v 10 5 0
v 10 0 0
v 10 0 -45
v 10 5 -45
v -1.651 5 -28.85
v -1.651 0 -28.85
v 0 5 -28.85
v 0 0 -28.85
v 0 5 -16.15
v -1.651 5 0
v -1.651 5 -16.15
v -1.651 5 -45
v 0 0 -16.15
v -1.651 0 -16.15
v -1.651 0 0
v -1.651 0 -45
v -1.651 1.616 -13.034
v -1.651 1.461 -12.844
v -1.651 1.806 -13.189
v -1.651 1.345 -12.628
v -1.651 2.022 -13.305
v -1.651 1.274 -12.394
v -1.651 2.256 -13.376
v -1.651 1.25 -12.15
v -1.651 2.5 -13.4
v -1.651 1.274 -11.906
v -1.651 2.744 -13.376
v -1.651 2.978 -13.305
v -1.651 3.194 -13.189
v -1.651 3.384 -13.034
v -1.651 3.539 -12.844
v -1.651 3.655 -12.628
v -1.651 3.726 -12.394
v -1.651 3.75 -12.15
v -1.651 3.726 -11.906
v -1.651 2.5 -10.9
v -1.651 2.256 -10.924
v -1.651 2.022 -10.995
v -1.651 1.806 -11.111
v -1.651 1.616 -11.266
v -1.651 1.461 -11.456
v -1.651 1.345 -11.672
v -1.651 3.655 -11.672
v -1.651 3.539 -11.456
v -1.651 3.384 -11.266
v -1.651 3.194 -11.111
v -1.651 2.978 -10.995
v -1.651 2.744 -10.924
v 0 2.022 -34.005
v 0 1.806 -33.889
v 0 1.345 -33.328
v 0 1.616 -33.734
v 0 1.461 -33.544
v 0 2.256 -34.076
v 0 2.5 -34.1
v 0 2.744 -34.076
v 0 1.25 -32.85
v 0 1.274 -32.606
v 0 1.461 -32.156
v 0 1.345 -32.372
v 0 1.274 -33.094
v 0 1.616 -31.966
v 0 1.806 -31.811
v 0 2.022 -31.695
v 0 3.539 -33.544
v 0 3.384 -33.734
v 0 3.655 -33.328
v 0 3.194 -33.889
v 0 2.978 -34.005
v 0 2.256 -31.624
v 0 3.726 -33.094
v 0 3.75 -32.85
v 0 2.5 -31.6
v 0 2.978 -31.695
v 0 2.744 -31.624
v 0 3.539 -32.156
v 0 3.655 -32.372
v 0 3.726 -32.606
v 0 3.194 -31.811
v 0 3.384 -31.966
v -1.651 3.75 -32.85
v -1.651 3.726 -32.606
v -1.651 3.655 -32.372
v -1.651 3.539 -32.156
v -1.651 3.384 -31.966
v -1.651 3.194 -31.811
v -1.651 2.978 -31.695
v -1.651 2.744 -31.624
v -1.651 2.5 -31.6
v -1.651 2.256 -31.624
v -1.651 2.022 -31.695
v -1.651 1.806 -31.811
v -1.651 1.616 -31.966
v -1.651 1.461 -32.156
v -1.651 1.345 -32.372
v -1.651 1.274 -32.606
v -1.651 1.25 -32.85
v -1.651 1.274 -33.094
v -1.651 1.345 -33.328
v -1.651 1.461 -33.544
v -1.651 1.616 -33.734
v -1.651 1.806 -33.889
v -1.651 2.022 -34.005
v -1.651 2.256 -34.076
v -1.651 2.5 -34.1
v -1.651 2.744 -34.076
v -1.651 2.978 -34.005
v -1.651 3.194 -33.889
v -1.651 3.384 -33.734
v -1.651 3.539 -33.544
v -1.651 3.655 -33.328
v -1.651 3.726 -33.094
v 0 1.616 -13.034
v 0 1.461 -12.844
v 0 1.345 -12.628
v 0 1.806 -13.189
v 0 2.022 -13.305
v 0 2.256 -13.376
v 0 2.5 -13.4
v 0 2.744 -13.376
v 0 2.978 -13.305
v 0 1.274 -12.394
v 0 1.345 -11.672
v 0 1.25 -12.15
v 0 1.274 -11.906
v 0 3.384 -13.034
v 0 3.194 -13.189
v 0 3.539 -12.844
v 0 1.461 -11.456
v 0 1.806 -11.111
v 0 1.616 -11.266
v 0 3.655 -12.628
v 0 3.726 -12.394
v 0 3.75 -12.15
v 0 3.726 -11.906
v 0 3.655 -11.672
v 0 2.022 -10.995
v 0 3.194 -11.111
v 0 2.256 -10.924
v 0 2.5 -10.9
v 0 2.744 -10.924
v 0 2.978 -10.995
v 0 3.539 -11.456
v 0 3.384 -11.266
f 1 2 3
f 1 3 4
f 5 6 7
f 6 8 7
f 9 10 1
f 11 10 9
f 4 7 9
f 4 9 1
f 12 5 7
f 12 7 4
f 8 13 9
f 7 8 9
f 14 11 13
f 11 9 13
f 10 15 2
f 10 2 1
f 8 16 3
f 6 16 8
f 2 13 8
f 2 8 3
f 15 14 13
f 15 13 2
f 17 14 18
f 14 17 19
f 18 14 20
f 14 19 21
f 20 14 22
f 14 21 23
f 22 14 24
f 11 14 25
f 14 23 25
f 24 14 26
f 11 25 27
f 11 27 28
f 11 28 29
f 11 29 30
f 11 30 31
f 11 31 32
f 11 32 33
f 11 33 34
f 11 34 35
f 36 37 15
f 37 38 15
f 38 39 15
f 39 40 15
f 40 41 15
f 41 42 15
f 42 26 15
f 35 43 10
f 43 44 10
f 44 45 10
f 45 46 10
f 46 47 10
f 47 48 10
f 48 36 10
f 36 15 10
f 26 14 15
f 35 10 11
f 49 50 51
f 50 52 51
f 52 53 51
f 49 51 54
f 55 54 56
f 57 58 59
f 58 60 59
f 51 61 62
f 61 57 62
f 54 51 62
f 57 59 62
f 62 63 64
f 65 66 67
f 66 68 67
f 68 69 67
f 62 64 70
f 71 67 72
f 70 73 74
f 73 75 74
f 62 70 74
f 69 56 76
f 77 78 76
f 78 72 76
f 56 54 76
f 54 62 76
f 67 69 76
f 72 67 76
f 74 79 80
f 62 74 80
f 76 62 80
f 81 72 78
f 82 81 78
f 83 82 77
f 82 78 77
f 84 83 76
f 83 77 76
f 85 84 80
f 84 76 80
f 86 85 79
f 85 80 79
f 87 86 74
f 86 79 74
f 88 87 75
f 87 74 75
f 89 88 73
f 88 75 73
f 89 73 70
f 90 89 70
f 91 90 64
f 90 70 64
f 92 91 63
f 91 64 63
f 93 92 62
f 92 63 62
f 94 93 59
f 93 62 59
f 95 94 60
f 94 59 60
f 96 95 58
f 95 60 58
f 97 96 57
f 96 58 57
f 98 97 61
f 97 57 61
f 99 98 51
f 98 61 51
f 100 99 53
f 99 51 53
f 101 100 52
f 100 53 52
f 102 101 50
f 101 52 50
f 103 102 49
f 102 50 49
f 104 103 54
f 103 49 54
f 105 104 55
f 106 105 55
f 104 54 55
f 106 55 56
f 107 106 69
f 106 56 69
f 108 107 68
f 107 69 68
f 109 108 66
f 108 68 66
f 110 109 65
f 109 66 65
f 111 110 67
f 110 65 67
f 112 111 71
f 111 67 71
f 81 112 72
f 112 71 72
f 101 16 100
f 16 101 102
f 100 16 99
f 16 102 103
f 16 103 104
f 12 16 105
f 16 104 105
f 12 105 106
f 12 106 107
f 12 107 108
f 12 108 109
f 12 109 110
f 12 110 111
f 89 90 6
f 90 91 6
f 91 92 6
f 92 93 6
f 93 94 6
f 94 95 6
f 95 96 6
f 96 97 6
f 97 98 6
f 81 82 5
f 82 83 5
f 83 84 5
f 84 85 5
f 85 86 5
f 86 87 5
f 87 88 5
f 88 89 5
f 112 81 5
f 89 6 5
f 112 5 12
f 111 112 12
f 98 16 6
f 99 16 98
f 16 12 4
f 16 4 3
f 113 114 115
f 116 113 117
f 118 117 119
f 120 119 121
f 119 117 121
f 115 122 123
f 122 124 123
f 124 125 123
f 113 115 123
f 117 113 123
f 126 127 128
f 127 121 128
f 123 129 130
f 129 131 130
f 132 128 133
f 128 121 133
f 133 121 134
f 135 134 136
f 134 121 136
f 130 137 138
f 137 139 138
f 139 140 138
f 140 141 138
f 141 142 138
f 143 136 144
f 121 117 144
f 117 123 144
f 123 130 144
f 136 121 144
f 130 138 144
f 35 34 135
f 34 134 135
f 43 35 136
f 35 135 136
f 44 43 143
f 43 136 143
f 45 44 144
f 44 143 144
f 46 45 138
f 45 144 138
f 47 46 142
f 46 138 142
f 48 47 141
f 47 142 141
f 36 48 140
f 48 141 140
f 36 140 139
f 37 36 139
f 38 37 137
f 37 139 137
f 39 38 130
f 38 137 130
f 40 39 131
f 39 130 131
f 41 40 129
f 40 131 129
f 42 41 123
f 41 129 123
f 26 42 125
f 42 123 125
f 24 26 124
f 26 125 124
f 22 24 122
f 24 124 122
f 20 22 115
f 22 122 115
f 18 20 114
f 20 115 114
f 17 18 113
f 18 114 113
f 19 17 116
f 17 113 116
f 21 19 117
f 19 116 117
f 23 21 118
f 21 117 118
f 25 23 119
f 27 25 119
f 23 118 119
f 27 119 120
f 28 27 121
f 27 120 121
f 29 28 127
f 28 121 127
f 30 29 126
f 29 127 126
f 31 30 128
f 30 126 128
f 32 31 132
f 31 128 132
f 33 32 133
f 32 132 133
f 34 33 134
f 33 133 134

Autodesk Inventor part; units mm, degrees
ref_plane "YZ Plane" through (0, 0, 0) normal (1, 0, 0) x (0, 1, 0)
ref_plane "XZ Plane" through (0, 0, 0) normal (0, 1, 0) x (-1, 0, 0)
ref_plane "XY Plane" through (0, 0, 0) normal (0, 0, 1) x (1, 0, 0)
sketch "スケッチ1" plane through (0, 0, 0) normal (1, 0, 0) x (0, 1, 0)
  line L0 (0, 0) -> (5, 0)
  line L1 (5, 0) -> (5, -45)
  line L2 (5, -45) -> (0, -45)
  line L3 (0, -45) -> (0, 0)
  circle A0 centre (2.5, -12.15) radius 1.25
  line L4 (0, -13) -> (5, -13)
  line L5 (5, -13) -> (5, -32)
  line L6 (5, -32) -> (0, -32)
  line L7 (0, -32) -> (0, -13)
  circle A1 centre (2.5, -12.15) radius 3.5
  line L8 (0, -22.5) -> (5, -22.5)
  circle A2 centre (2.5, -32.85) radius 1.25
  line L9 (5, -16.15) -> (0, -16.15)
  line L10 (0, -16.15) -> (0, -28.85)
  line L11 (0, -28.85) -> (5, -28.85)
  line L12 (5, -28.85) -> (5, -16.15)
  point P0 (5, -28.85)
  point P1 (0, -28.85)
  point P2 (0, -16.15)
  point P3 (5, -16.15)
  dimension "d0" = 5
  dimension "d1" = 45
  dimension "d2" = 2.5
  dimension "d4" = 5
  dimension "d5" = 19
  dimension "d7" = 12.15
  dimension "d8" = 2.5
  dimension "d9" = 7
  dimension "d19" = 5
  dimension "d20" = 12.7
  dimension "d21" = 6.35
  dimension "d28" = 13
extrude "押し出し1" add sketch "スケッチ1" along normal blind 10 contours L0 L1 A1 L3 | A1 L1 L4 A0 L3 | L4 A0 L1 A1 L3 | A1 L1 L9 L3 | L4 A0 | A0 L4 | L9 L1 L8 L3 | L8 L1 L11 L3 | L11 L1 L6 A2 L3 | L6 A2 L1 L2 L3 | A2 L6 | L6 A2
extrude "押し出し2" add sketch "スケッチ1" against normal blind 1.651 contours L0 L1 A1 L3 | A1 L1 L4 A0 L3 | L4 A0 L1 A1 L3 | A1 L1 L9 L3 | L11 L1 L6 A2 L3 | L6 A2 L1 L2 L3
thread "ねじ1" size "M2.5x0.45" class "6H" standard "ANSI Metric M Profile" full length
thread "ねじ2" size "M2.5x0.45" class "6H" standard "ANSI Metric M Profile" full length
properties part number "belt_liner_v2_Plate_19" material "アルミニウム 6061"
